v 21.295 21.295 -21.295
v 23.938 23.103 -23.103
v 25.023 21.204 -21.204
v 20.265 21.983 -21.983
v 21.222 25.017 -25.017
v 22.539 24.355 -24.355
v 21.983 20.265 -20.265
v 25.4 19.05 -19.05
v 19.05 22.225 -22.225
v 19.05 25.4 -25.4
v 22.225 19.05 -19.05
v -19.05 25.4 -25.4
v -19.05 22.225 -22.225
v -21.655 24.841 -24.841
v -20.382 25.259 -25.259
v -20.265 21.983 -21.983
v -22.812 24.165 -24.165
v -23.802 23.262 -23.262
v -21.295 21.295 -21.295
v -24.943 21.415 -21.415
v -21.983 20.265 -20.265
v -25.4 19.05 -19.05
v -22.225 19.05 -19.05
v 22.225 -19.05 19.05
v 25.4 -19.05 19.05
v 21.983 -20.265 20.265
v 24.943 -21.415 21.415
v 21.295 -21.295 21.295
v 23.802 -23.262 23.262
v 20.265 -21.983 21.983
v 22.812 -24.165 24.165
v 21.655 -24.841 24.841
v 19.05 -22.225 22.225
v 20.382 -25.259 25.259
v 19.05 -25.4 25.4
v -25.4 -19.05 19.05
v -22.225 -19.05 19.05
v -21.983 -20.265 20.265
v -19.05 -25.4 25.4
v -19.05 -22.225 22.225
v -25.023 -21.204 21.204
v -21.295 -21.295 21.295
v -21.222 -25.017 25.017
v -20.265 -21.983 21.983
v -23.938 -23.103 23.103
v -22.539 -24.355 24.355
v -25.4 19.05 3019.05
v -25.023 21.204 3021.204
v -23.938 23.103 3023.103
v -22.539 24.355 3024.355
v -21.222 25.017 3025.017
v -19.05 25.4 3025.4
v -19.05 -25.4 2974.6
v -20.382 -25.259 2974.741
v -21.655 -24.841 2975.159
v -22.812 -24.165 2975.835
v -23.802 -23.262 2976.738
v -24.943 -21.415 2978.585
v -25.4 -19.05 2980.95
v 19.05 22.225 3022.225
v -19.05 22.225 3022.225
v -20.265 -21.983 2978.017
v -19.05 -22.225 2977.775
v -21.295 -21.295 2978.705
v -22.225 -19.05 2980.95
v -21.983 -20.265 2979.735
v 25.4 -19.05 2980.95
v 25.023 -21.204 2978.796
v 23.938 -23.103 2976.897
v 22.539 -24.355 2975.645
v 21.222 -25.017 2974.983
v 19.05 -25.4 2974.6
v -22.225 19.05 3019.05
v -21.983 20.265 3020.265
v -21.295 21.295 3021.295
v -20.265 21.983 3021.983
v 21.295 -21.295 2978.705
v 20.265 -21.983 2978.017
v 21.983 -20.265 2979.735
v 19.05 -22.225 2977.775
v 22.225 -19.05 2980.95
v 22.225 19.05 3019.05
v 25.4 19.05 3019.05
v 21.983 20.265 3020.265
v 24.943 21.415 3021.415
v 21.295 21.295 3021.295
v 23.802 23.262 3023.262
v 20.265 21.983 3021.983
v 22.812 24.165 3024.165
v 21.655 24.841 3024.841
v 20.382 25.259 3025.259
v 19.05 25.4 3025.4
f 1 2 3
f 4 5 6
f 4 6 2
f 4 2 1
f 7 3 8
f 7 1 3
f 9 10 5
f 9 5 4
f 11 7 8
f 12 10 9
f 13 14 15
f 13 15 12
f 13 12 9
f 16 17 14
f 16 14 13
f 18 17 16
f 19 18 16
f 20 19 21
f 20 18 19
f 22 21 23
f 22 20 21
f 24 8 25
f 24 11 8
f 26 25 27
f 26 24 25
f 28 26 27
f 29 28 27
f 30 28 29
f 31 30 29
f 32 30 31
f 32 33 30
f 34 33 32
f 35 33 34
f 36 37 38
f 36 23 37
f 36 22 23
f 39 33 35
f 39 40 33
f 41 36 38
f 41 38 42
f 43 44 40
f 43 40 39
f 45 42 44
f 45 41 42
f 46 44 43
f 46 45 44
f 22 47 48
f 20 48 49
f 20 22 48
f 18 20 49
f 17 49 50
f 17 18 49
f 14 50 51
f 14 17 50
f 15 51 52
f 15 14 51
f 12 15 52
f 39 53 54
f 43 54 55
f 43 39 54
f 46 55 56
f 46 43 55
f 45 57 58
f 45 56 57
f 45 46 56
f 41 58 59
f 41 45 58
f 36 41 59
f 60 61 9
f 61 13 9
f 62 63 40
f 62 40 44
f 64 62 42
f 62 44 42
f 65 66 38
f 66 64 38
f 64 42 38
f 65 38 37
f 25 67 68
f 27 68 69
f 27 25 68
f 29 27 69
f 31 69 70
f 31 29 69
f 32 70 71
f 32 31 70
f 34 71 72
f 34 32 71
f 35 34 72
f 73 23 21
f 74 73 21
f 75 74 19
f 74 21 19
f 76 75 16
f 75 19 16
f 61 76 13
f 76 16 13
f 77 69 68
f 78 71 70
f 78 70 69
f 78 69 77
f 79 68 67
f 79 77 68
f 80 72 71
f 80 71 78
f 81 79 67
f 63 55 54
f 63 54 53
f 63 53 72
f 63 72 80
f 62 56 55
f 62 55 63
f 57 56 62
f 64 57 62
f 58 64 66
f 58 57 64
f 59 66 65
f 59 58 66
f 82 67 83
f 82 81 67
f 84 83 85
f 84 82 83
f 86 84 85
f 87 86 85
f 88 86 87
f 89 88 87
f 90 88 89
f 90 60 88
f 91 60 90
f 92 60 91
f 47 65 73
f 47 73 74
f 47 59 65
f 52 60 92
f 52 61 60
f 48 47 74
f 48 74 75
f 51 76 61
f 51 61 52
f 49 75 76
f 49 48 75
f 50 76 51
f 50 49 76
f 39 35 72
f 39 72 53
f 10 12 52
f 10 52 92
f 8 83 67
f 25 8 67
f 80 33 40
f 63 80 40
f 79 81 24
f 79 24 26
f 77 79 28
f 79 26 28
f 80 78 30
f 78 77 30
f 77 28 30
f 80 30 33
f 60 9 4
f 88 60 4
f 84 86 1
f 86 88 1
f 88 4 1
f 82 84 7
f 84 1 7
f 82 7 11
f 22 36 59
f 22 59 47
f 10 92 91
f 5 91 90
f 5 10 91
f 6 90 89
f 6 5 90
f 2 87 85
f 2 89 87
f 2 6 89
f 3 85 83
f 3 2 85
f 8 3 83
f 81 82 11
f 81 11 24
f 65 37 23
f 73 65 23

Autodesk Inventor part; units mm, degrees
ref_plane "Plano inicial" through (0, 0, -25.4) normal (0, 0, 1) x (1, 0, 0)
ref_plane "Plano final" through (0, 0, 3025.4) normal (0, 0, 1) x (1, 0, 0)
sketch "Boceto" plane through (0, 0, 0) normal (0, 0, 1) x (1, 0, 0)
  line L0 (-25.4, -19.05) -> (-25.4, 19.05)
  line L1 (-19.05, 25.4) -> (19.05, 25.4)
  line L2 (25.4, 19.05) -> (25.4, -19.05)
  line L3 (19.05, -25.4) -> (-19.05, -25.4)
  arc A0 (-25.4, -19.05) -> (-19.05, -25.4) centre (-19.05, -19.05) ccw
  arc A1 (-19.05, 25.4) -> (-25.4, 19.05) centre (-19.05, 19.05) ccw
  arc A2 (25.4, 19.05) -> (19.05, 25.4) centre (19.05, 19.05) ccw
  arc A3 (19.05, -25.4) -> (25.4, -19.05) centre (19.05, -19.05) ccw
  arc A4 (-19.05, 22.225) -> (-22.225, 19.05) centre (-19.05, 19.05) ccw
  line L4 (-19.05, 22.225) -> (19.05, 22.225)
  arc A5 (22.225, 19.05) -> (19.05, 22.225) centre (19.05, 19.05) ccw
  line L5 (22.225, 19.05) -> (22.225, -19.05)
  arc A6 (19.05, -22.225) -> (22.225, -19.05) centre (19.05, -19.05) ccw
  line L6 (19.05, -22.225) -> (-19.05, -22.225)
  arc A7 (-22.225, -19.05) -> (-19.05, -22.225) centre (-19.05, -19.05) ccw
  line L7 (-22.225, -19.05) -> (-22.225, 19.05)
  line L8 (0, 37.4012) -> (0, -37.4012) construction
  line L9 (-37.4012, 0) -> (37.4012, 0) construction
  dimension "d10" = 50.8
  dimension "d11" = 50.8
  dimension "d12" = 3.175
  dimension "d15" = 25.4
  dimension "d16" = 25.4
  dimension "d17" = 6.35
extrude "Cuerpo" add sketch "Boceto" along normal up to surface (3050.8 mm away) from surface at -25.4
sketch "Sketch3" plane through (0, 0, 0) normal (0, 0, 1) x (1, 0, 0)
  line L0 (0, 0) -> (10, 0)
ref_plane "Work Plane3" through (0, 0, 0) normal (0, -1, 0) x (1, 0, 0)
ref_plane "Plano de trabajo4" through (0, 25.4, 3025.4) normal (0, -0.7071, 0.7071) x (1, 0, 0)
split "Dividir1" plane through (0, 25.4, 3025.4) removes the side toward (0, -0.7071, 0.7071)
ref_plane "Plano de trabajo5" through (0, 25.4, -25.4) normal (0, -0.7071, -0.7071) x (1, 0, 0)
split "Dividir2" plane through (0, 25.4, -25.4) removes the side toward (0, -0.7071, -0.7071)
sketch "Sketch4" plane through (0, 0, 0) normal (0, -1, 0) x (1, 0, 0)
  line L0 (-2, -25.4) -> (12, -25.4) projected
  line L1 (-2, 3025.4) -> (12, 3025.4) projected
  dimension "d19" = 3050.8
equation "\"d10\" = G_H"
equation "\"d11\" = G_W"
equation "\"d12\" = G_T"
equation "\"d15\" = 0.5 * d10"
equation "\"d16\" = 0.5 * d11"
equation "\"d17\" = G_IR"
equation "\"d3\" = G_L"
equation "\"G_W\" = 50.8"
equation "\"G_H\" = 50.8"
equation "\"G_T\" = 3.175"
equation "\"G_IR\" = 6.35"
equation "\"G_L\" = d19"
equation "\"G_OFFSET_START\" = 25.4"
equation "\"G_OFFSET_END\" = 25.4"
equation "\"d13\" = -G_OFFSET_START"
equation "\"d14\" = G_OFFSET_END + B_L"
equation "\"B_L\" = 3000"
properties part number "AISC - 2 x 2 x 1/8 - 120,11" material "Acero, suave"
